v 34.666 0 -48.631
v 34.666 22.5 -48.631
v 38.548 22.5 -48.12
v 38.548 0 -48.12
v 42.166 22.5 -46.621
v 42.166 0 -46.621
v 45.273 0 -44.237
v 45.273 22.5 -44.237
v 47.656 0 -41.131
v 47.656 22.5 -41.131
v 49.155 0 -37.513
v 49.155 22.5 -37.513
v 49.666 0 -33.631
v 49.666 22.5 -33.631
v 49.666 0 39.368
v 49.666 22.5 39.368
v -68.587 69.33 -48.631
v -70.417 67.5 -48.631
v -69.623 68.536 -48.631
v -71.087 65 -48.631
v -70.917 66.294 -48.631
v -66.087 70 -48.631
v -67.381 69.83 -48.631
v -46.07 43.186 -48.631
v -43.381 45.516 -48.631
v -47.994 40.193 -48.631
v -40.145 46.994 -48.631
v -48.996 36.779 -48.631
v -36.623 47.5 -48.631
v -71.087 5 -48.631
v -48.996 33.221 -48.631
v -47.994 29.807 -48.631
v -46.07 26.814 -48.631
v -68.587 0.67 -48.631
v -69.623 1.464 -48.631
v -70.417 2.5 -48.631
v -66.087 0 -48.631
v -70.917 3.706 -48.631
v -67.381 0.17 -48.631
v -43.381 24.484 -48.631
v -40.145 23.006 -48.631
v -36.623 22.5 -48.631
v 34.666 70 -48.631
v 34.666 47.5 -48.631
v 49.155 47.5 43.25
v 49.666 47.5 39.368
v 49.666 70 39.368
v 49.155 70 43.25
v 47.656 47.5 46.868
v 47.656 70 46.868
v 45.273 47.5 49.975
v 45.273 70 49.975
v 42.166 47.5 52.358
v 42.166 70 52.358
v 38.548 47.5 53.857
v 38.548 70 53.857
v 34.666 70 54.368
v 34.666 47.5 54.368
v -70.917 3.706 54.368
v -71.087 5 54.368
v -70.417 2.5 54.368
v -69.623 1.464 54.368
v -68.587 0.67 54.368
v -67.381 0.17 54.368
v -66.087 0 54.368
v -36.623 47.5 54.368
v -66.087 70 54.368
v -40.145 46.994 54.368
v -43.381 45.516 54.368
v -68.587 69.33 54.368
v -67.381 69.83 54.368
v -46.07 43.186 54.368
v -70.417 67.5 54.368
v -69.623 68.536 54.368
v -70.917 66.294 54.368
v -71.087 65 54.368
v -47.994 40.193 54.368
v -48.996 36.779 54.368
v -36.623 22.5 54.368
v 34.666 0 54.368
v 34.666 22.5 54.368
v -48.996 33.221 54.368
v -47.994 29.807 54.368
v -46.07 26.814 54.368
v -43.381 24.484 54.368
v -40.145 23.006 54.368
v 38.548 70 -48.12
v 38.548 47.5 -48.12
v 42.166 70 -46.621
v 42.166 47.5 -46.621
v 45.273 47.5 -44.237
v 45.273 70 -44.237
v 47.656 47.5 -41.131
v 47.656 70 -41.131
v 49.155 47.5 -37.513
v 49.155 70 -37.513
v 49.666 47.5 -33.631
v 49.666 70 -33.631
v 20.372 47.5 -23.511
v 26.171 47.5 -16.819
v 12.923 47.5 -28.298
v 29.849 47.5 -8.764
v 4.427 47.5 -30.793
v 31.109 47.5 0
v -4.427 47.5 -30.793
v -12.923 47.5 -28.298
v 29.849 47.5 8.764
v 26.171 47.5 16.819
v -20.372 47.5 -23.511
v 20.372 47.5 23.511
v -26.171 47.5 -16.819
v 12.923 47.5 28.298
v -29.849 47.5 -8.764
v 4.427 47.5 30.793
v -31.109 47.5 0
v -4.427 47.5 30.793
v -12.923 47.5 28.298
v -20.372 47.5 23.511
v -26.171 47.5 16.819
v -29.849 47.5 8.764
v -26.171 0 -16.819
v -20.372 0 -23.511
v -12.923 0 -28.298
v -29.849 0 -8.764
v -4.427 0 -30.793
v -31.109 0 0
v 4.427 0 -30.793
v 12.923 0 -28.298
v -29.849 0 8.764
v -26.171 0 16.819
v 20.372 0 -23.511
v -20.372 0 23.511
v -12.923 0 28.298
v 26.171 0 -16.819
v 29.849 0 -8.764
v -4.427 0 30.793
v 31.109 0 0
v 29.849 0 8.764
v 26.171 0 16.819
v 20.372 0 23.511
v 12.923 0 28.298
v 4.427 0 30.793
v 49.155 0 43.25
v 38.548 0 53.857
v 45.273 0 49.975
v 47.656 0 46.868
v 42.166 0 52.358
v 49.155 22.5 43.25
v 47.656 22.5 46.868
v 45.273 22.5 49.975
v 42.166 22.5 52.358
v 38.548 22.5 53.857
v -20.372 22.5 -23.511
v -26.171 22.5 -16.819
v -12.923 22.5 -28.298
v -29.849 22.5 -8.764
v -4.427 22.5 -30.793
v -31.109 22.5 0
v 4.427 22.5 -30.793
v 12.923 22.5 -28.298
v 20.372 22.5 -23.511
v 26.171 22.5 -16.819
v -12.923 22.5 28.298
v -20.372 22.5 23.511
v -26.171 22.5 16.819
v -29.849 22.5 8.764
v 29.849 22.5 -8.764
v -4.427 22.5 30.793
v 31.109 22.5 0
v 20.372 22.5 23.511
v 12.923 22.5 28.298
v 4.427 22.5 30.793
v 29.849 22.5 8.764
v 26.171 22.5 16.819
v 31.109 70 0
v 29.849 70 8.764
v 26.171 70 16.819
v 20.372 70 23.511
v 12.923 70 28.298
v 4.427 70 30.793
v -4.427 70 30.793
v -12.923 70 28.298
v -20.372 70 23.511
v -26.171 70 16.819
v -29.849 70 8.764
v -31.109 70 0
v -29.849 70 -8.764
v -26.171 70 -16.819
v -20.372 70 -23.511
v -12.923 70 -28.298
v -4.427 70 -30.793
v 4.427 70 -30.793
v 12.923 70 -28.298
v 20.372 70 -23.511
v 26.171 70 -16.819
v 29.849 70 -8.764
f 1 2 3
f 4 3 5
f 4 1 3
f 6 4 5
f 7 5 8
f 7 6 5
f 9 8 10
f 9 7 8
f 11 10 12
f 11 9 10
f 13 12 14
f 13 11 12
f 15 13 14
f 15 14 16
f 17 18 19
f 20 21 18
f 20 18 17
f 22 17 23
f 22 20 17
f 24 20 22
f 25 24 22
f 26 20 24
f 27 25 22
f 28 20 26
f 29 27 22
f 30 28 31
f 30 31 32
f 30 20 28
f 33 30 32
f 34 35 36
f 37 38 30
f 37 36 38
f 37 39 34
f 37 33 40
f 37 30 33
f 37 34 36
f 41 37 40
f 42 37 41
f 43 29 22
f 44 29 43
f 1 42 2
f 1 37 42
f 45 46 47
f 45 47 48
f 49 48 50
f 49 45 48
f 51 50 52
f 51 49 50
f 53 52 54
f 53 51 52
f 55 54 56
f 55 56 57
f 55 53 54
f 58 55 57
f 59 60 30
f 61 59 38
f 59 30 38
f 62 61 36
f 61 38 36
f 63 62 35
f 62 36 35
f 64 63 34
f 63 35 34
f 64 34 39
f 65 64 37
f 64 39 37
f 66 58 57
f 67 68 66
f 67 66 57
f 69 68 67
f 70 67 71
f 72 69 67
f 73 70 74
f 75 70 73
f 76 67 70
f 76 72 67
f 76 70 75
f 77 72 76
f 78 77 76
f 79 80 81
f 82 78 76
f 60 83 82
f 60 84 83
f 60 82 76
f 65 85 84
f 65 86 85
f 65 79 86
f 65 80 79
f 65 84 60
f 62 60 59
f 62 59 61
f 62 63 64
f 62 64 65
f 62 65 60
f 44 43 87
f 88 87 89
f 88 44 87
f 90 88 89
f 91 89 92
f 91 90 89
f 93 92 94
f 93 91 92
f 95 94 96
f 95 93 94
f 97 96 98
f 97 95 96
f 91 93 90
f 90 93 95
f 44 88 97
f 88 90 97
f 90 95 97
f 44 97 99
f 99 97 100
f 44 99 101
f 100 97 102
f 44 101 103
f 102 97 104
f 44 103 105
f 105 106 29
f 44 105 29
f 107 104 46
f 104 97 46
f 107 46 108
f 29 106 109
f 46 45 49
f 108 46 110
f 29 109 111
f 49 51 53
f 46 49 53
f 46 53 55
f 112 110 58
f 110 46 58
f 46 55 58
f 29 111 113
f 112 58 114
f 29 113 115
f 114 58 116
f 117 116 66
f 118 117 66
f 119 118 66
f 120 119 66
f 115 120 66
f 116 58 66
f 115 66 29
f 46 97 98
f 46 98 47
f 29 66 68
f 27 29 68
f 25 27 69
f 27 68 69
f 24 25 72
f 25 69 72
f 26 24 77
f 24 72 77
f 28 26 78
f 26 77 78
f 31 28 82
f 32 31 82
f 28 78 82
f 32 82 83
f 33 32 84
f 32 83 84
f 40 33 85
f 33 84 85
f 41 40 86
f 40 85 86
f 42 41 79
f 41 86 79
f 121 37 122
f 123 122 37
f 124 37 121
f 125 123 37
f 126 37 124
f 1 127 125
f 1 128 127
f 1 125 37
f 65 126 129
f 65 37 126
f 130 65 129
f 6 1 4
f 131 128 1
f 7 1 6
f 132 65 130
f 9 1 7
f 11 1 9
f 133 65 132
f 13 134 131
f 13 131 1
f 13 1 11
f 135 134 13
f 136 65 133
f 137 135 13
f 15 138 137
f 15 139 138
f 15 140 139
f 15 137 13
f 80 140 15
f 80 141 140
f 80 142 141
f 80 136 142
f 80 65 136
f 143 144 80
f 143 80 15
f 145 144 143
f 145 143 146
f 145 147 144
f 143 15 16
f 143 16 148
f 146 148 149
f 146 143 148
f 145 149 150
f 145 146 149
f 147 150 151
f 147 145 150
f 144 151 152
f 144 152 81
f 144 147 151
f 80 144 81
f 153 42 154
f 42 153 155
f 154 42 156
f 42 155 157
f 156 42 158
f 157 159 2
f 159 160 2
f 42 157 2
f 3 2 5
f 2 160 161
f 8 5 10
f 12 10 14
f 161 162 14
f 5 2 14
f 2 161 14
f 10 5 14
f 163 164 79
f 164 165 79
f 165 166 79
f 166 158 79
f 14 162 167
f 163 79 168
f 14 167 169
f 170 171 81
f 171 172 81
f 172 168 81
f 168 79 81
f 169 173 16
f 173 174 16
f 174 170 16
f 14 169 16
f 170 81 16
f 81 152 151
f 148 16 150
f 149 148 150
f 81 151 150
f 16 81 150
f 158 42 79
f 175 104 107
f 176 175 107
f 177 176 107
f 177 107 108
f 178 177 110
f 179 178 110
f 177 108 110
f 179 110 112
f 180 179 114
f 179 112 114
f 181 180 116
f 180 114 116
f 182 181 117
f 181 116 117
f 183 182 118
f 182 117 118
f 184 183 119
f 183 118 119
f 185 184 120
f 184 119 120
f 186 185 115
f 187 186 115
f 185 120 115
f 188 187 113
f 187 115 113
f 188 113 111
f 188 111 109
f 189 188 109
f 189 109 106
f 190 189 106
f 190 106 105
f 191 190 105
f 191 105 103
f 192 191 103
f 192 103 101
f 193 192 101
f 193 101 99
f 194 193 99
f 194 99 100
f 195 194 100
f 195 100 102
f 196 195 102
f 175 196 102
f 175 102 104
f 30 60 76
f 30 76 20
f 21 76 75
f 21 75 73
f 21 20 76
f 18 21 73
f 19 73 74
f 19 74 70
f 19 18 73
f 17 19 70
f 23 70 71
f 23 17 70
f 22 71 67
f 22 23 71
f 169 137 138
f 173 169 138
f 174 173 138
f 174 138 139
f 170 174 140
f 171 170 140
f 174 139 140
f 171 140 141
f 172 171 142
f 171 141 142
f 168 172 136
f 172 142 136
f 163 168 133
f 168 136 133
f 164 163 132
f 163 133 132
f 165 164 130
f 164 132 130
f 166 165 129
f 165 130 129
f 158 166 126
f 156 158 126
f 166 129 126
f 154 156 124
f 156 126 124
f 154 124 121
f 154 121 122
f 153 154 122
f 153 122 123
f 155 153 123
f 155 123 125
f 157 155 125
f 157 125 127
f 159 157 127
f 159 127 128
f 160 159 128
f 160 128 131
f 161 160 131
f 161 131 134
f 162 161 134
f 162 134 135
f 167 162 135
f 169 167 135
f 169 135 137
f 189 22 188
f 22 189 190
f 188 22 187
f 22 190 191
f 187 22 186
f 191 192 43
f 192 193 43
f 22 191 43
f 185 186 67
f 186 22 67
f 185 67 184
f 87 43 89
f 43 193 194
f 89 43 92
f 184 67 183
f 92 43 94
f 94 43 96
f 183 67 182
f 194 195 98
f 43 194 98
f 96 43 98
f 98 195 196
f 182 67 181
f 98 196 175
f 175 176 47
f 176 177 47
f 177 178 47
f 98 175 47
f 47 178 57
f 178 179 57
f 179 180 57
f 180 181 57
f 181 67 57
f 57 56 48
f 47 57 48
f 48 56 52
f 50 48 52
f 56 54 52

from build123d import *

# Parameters (mm, degrees)
F1_DEPTH = 70
F2_R     = 5
F3_W     = 36.3545330494
F3_H     = 25
F4_DEPTH = 102.9998127055
F5_R     = 31.1092179588
F6_DEPTH = 70.001


with BuildPart() as f1:
    # F0 (on Front) → F1 (new body)
    with BuildSketch(Plane.XZ):
        with BuildLine():
            Line((34.6660999328, 54.3679218974), (-71.0870698094, 54.3679218974))
            Line((-71.0870698094, 54.3679218974), (-71.0870698094, -48.6308908081))
            Line((-71.0870698094, -48.6308908081), (34.6660999328, -48.6308908081))
            ThreePointArc((34.6660999328, -48.6308908081), (45.2727016506, -44.2374925259), (49.6660999328, -33.6308908081))
            Line((49.6660999328, -33.6308908081), (49.6660999328, 39.3679218974))
            ThreePointArc((49.6660999328, 39.3679218974), (45.2727016506, 49.9745236152), (34.6660999328, 54.3679218974))
        make_face()
    extrude(amount=-F1_DEPTH)

    # F2
    f2_edges = [f1.edges().sort_by_distance(p)[0] for p in [
        (-71.08707, 0, 2.868516),
        (-71.08707, 70, 2.868516),
    ]]
    fillet(f2_edges, radius=F2_R)

    # F3 (on face) → F4 (cut, through all)
    with BuildSketch(Plane.XY.offset(54.3679218974)):
        with BuildLine():
            Line((34.6660999328, 47.5), (-36.6232544184, 47.5))
            ThreePointArc((-36.6232544184, 47.5), (-49.1232544184, 35), (-36.6232544184, 22.5))
            Line((-36.6232544184, 22.5), (34.6660999328, 22.5))
            Line((34.6660999328, 22.5), (34.6660999328, 47.5))
        make_face()
        with Locations((52.8433664575, 35)):
            Rectangle(F3_W, F3_H)
    extrude(amount=-F4_DEPTH, mode=Mode.SUBTRACT)

    # F5 (on face) → F6 (cut, through all)
    with BuildSketch(Plane.XZ):
        Circle(F5_R)
    extrude(amount=-F6_DEPTH, mode=Mode.SUBTRACT)


solid = f1.part
